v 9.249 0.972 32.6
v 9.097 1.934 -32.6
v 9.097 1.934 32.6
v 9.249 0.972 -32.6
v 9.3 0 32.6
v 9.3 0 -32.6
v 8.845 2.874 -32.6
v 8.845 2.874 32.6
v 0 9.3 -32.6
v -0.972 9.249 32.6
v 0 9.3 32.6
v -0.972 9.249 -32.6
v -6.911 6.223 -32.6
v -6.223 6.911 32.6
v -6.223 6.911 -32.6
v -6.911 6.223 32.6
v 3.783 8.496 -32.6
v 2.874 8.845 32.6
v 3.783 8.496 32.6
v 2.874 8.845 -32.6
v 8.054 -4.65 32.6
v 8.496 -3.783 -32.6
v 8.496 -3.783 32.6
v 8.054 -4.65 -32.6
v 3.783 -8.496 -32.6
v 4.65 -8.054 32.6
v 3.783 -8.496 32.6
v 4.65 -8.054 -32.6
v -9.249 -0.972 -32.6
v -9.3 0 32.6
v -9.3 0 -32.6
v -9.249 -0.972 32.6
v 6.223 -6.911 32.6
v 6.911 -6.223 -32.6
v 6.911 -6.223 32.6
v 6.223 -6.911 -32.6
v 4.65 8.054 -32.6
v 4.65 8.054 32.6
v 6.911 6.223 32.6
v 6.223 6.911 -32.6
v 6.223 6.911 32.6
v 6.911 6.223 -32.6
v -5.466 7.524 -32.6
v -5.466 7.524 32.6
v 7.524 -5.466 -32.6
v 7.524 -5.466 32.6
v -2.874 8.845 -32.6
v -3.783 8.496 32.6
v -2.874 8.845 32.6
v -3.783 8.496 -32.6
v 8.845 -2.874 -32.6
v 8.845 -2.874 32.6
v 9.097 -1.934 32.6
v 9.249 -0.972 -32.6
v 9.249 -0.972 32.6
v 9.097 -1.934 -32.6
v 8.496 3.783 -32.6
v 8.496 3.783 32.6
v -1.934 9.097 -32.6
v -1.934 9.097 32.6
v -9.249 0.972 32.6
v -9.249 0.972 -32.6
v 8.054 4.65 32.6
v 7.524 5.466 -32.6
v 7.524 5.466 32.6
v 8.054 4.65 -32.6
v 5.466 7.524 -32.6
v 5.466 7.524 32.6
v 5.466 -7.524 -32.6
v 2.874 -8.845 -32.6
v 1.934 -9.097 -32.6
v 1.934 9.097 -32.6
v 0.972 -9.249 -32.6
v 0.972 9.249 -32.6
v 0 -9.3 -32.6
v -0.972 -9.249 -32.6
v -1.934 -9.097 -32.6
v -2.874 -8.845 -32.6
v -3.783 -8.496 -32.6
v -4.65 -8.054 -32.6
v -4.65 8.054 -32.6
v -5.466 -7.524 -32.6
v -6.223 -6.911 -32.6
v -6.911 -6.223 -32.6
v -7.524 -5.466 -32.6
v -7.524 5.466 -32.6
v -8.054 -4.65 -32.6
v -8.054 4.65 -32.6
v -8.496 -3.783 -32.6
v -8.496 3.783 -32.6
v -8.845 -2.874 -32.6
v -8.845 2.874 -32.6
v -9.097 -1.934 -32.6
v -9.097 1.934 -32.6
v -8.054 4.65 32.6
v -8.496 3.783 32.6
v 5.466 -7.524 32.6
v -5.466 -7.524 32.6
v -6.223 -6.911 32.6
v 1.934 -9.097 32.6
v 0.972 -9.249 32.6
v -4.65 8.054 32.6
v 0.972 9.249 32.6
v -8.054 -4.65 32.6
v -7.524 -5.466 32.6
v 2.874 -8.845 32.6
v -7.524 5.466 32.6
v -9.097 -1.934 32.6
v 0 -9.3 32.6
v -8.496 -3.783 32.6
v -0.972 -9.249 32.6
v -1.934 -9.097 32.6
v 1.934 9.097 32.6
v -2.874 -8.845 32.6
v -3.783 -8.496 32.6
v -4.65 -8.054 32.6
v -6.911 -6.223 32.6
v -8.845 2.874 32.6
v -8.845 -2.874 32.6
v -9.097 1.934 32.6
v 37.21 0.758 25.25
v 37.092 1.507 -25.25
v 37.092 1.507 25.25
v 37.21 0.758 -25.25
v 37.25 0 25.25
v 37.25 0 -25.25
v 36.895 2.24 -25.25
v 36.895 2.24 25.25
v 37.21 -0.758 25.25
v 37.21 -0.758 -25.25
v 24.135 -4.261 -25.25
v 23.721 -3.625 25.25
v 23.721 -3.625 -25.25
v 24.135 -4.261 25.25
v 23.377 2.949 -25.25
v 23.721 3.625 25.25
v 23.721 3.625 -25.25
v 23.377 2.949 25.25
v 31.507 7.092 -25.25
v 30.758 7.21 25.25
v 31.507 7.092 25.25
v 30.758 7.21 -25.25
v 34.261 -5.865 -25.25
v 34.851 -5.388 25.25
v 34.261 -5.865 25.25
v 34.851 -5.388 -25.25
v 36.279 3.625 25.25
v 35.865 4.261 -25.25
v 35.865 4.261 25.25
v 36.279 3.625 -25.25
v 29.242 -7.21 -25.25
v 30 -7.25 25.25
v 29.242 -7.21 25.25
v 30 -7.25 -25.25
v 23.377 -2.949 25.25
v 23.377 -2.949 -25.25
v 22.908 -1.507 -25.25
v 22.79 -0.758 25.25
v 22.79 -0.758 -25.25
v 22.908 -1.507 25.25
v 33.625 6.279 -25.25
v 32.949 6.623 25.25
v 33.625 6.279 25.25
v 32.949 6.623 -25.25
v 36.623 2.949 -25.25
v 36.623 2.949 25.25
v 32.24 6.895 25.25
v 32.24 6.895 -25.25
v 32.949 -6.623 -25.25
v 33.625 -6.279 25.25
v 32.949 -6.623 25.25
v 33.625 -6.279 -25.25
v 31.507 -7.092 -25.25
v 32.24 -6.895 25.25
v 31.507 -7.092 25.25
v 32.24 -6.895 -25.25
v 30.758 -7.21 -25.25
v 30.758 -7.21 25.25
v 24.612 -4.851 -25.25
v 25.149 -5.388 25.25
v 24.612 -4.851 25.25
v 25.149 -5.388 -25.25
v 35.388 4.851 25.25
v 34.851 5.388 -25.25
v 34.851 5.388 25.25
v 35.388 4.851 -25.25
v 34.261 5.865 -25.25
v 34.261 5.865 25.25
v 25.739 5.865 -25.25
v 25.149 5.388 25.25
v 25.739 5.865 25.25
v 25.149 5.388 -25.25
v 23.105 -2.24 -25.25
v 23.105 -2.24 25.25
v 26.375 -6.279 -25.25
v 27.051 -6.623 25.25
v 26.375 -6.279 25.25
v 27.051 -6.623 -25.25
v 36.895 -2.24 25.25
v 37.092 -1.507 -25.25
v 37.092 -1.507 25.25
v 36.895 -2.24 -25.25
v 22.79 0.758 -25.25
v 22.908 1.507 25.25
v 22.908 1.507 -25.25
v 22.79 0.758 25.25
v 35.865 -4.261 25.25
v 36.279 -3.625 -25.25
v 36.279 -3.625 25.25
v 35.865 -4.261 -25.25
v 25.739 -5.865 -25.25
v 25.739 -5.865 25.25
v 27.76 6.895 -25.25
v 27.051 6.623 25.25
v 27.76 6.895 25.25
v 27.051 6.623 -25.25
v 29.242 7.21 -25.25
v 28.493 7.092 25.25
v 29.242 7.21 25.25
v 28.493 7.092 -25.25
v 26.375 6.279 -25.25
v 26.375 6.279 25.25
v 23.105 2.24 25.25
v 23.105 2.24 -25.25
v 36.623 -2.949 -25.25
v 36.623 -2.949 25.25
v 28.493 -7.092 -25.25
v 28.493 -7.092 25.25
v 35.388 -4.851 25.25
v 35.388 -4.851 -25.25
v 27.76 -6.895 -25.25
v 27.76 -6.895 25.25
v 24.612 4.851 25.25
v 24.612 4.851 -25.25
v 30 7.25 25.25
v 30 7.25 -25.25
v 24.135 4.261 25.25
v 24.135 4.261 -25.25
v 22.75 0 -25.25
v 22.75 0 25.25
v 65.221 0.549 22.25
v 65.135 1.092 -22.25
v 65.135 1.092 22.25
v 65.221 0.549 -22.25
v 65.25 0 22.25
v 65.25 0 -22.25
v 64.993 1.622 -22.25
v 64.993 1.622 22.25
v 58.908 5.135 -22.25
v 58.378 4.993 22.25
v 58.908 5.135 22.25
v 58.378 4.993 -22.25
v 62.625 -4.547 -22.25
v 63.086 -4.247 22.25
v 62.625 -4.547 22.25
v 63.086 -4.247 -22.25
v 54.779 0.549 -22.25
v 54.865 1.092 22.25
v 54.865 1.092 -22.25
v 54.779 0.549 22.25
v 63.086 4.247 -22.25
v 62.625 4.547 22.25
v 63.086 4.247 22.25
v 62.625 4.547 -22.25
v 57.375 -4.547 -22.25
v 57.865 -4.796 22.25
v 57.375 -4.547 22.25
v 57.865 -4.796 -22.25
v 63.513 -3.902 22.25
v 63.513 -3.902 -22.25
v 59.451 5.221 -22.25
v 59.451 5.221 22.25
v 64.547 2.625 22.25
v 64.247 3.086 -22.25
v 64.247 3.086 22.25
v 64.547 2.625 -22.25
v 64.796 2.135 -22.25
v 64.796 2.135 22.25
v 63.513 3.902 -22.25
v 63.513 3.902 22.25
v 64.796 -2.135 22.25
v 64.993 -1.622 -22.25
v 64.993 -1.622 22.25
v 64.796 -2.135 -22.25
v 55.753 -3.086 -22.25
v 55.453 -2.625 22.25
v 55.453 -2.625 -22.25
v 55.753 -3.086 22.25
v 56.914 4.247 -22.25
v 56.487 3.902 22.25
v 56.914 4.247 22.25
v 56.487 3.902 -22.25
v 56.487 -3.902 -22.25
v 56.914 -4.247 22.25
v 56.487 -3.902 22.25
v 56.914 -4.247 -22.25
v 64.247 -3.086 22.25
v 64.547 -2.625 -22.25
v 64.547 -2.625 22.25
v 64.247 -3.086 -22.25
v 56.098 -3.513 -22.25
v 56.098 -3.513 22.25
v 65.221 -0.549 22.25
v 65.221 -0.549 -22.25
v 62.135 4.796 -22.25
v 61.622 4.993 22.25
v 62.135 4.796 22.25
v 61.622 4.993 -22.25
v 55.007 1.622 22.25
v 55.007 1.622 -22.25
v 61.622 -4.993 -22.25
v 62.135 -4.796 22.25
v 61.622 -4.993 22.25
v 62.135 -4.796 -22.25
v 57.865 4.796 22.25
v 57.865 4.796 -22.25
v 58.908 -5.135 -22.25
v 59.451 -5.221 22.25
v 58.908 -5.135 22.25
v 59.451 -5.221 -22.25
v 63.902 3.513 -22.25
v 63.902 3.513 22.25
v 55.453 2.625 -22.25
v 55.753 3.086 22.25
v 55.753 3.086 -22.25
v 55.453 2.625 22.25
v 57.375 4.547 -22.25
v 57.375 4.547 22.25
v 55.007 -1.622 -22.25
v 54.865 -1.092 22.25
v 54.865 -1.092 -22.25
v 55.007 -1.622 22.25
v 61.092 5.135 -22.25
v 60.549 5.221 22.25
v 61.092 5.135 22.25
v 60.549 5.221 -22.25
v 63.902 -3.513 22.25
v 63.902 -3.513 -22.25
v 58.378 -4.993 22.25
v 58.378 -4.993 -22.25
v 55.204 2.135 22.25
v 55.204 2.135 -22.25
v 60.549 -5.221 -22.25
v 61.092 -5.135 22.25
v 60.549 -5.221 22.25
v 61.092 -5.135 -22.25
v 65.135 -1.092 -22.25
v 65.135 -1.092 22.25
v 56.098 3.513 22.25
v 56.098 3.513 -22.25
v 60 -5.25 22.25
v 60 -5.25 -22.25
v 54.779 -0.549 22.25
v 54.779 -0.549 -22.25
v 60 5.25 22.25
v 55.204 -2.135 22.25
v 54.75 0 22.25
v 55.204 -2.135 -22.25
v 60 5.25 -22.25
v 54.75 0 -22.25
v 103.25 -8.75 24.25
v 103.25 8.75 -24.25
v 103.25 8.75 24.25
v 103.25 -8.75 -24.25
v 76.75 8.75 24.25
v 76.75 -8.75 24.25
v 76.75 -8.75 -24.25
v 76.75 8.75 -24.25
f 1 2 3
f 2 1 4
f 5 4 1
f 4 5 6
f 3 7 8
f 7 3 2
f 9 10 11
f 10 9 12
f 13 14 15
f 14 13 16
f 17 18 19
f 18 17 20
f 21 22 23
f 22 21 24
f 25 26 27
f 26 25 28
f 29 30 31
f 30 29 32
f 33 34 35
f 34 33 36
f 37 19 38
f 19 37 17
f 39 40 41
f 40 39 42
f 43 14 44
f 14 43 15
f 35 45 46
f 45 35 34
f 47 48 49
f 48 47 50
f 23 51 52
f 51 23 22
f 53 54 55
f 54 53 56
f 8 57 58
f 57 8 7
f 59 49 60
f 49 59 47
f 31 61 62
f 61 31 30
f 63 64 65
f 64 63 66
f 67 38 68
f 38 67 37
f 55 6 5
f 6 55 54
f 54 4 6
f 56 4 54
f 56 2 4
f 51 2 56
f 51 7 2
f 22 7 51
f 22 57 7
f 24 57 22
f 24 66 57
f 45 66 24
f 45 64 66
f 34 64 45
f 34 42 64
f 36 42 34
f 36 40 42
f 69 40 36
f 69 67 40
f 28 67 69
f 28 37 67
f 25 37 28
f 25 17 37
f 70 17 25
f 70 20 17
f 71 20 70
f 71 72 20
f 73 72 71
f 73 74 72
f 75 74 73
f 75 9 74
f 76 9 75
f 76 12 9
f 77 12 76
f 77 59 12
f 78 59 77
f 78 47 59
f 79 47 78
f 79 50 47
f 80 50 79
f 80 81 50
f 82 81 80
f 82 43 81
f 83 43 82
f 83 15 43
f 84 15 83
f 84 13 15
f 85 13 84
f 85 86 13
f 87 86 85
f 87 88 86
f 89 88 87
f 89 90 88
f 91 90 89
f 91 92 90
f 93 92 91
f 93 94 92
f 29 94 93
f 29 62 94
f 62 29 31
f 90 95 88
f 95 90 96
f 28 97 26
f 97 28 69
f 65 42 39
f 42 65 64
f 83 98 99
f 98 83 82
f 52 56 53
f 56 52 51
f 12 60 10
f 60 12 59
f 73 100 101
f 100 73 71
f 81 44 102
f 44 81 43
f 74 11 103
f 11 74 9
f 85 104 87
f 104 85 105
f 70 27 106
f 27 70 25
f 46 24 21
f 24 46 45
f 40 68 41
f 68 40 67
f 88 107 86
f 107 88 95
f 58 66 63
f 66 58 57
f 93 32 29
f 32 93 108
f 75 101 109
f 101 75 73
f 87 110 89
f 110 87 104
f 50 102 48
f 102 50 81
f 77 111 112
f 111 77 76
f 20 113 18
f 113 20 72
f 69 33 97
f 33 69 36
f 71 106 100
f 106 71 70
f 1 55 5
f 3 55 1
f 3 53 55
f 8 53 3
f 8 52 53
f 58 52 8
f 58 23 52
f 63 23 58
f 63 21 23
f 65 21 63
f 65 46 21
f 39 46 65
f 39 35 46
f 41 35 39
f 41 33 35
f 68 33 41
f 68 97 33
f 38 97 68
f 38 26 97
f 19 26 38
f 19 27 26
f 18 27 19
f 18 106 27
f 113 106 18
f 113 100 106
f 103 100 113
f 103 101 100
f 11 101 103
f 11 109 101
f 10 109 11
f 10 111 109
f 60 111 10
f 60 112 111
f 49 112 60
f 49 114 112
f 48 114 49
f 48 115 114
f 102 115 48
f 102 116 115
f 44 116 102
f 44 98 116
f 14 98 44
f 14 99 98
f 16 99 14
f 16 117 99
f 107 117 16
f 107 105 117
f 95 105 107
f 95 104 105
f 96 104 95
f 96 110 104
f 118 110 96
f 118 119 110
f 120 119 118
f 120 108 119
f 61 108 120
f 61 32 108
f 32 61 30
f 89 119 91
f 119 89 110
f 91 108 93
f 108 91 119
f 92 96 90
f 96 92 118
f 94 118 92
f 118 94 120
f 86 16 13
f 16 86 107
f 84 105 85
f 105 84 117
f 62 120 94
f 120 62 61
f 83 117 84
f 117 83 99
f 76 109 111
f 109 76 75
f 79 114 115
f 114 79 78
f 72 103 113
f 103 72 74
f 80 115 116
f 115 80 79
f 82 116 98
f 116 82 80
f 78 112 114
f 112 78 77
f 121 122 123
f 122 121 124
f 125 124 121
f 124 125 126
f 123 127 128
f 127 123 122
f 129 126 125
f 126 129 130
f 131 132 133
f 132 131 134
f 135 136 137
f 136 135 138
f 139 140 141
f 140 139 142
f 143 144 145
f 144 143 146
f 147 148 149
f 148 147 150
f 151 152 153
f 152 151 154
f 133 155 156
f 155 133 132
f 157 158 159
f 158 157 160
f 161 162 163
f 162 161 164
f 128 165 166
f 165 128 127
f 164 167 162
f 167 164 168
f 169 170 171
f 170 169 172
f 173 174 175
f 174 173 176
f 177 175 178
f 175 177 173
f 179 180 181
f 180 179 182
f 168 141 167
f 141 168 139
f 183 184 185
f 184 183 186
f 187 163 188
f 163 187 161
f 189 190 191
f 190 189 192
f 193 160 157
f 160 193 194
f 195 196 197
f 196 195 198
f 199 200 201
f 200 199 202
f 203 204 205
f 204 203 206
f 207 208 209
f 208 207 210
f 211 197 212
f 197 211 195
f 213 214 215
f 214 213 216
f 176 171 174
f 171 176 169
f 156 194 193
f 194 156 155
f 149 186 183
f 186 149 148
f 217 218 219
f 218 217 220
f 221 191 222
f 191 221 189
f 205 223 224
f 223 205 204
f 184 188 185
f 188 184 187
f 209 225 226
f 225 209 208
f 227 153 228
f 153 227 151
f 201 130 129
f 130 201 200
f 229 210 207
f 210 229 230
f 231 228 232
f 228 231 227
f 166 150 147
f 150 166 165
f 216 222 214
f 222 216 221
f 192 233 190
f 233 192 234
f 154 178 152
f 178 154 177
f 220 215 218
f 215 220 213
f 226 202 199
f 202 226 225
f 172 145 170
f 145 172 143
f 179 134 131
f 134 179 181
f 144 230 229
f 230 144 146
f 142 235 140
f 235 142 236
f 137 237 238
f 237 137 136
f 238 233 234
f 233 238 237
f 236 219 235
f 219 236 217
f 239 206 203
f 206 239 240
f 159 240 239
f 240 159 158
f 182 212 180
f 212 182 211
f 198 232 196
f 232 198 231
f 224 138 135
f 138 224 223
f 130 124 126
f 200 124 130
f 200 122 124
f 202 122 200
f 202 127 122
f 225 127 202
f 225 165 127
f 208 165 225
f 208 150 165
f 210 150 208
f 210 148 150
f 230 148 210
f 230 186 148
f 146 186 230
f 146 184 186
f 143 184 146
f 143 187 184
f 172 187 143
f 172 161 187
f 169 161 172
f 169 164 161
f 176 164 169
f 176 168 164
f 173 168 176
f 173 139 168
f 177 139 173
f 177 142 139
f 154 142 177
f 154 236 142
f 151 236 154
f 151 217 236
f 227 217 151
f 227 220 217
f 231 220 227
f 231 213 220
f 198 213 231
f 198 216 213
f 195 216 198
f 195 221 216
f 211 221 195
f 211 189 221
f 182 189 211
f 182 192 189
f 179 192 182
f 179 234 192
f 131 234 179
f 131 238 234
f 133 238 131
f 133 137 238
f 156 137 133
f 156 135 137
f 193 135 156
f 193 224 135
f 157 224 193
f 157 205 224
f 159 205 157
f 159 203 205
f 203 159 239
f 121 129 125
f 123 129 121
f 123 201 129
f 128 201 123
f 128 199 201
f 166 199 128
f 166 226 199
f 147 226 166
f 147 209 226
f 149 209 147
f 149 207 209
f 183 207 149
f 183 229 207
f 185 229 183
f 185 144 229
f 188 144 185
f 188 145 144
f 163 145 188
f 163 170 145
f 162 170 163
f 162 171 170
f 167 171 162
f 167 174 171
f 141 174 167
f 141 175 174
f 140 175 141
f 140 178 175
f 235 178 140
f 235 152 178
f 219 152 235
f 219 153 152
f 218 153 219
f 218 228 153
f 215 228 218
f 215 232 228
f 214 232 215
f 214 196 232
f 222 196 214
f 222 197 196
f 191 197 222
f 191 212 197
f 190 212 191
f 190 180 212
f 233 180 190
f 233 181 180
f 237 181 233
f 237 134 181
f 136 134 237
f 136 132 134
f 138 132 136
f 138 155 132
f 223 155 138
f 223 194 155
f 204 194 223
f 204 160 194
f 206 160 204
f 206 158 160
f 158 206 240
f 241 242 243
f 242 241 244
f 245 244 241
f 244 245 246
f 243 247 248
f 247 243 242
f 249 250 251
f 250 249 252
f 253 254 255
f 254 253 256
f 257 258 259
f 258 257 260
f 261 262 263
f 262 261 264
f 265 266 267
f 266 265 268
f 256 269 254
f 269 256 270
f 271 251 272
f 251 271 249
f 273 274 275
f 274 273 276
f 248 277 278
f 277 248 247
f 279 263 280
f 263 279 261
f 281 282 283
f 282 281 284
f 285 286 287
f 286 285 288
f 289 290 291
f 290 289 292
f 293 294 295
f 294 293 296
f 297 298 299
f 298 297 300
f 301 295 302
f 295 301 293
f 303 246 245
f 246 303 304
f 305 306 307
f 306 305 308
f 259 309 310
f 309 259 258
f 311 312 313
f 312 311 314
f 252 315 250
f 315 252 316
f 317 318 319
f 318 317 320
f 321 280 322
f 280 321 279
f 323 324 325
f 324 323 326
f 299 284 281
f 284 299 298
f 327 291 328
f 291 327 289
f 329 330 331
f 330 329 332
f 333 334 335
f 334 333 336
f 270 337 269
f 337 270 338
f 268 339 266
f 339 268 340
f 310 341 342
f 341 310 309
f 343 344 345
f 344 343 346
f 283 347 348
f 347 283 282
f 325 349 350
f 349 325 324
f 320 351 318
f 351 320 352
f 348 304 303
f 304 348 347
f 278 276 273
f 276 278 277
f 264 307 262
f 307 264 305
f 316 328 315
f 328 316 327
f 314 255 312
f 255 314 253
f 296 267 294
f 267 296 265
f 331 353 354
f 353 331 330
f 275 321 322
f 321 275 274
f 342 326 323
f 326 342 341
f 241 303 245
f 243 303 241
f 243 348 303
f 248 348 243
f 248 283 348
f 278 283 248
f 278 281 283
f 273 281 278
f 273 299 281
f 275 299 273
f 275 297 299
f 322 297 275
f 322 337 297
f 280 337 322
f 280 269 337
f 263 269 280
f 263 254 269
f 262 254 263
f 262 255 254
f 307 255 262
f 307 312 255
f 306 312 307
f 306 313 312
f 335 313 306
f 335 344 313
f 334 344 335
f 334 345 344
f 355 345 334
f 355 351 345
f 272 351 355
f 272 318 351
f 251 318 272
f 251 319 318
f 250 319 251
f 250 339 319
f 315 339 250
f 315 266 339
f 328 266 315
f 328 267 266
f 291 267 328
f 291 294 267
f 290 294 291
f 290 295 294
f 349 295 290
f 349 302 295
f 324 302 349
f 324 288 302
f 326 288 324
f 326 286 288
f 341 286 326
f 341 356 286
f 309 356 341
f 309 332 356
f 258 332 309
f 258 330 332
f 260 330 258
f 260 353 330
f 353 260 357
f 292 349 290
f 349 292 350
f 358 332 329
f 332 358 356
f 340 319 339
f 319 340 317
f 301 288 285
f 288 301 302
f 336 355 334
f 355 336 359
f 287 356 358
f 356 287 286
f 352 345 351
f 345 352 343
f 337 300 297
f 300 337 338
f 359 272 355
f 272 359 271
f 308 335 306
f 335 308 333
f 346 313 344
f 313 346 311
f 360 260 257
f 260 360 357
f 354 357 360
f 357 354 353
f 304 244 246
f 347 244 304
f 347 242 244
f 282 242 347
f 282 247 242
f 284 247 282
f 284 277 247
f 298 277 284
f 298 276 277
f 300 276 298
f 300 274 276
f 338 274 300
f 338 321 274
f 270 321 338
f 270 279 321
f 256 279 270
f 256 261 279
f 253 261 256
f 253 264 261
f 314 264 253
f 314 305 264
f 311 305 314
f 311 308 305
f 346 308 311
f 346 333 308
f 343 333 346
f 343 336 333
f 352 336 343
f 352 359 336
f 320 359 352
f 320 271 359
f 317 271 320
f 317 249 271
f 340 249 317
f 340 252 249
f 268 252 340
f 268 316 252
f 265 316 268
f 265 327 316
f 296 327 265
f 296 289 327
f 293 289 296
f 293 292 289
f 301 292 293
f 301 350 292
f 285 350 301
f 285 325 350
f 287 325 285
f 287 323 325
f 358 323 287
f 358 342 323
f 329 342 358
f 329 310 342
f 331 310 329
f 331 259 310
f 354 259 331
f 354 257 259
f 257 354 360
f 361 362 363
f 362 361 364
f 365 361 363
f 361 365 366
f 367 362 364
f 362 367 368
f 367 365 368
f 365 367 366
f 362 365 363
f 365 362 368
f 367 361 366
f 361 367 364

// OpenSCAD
// A set of rought reference models for a few common battery types.
// For reference: https://en.wikipedia.org/wiki/List_of_battery_sizes


// Increase 'number of fragments' for rounder models.
$fn = 60;



// 18650
height_18650 = 65.2; // mm
diameter_18650 = 18.6; // mm

module battery_18650(center=false) {
  cylinder(h=height_18650, d=diameter_18650, center=center);
}


// AA
height_AA = 50.5; // mm
diameter_AA = 14.5; // mm

module battery_AA(center=false) {
  cylinder(h=height_AA, d=diameter_AA, center=center);
}


// AAA
height_AAA = 44.5; // mm
diameter_AAA = 10.5; // mm

module battery_AAA(center=false) {
  cylinder(h=height_AAA, d=diameter_AAA, center=center);
}


// 9-volt
height_9v = 48.5; // mm
length_9v = 26.5; // mm
width_9v = 17.5; // mm

module battery_9v(center=false) {
  cube([length_9v, width_9v, height_9v], center=center);
}



// Examples

battery_18650(true);

translate([30, 0, 0])
  battery_AA(true);

translate([60, 0, 0])
  battery_AAA(true);

translate([90, 0, 0])
  battery_9v(true);
